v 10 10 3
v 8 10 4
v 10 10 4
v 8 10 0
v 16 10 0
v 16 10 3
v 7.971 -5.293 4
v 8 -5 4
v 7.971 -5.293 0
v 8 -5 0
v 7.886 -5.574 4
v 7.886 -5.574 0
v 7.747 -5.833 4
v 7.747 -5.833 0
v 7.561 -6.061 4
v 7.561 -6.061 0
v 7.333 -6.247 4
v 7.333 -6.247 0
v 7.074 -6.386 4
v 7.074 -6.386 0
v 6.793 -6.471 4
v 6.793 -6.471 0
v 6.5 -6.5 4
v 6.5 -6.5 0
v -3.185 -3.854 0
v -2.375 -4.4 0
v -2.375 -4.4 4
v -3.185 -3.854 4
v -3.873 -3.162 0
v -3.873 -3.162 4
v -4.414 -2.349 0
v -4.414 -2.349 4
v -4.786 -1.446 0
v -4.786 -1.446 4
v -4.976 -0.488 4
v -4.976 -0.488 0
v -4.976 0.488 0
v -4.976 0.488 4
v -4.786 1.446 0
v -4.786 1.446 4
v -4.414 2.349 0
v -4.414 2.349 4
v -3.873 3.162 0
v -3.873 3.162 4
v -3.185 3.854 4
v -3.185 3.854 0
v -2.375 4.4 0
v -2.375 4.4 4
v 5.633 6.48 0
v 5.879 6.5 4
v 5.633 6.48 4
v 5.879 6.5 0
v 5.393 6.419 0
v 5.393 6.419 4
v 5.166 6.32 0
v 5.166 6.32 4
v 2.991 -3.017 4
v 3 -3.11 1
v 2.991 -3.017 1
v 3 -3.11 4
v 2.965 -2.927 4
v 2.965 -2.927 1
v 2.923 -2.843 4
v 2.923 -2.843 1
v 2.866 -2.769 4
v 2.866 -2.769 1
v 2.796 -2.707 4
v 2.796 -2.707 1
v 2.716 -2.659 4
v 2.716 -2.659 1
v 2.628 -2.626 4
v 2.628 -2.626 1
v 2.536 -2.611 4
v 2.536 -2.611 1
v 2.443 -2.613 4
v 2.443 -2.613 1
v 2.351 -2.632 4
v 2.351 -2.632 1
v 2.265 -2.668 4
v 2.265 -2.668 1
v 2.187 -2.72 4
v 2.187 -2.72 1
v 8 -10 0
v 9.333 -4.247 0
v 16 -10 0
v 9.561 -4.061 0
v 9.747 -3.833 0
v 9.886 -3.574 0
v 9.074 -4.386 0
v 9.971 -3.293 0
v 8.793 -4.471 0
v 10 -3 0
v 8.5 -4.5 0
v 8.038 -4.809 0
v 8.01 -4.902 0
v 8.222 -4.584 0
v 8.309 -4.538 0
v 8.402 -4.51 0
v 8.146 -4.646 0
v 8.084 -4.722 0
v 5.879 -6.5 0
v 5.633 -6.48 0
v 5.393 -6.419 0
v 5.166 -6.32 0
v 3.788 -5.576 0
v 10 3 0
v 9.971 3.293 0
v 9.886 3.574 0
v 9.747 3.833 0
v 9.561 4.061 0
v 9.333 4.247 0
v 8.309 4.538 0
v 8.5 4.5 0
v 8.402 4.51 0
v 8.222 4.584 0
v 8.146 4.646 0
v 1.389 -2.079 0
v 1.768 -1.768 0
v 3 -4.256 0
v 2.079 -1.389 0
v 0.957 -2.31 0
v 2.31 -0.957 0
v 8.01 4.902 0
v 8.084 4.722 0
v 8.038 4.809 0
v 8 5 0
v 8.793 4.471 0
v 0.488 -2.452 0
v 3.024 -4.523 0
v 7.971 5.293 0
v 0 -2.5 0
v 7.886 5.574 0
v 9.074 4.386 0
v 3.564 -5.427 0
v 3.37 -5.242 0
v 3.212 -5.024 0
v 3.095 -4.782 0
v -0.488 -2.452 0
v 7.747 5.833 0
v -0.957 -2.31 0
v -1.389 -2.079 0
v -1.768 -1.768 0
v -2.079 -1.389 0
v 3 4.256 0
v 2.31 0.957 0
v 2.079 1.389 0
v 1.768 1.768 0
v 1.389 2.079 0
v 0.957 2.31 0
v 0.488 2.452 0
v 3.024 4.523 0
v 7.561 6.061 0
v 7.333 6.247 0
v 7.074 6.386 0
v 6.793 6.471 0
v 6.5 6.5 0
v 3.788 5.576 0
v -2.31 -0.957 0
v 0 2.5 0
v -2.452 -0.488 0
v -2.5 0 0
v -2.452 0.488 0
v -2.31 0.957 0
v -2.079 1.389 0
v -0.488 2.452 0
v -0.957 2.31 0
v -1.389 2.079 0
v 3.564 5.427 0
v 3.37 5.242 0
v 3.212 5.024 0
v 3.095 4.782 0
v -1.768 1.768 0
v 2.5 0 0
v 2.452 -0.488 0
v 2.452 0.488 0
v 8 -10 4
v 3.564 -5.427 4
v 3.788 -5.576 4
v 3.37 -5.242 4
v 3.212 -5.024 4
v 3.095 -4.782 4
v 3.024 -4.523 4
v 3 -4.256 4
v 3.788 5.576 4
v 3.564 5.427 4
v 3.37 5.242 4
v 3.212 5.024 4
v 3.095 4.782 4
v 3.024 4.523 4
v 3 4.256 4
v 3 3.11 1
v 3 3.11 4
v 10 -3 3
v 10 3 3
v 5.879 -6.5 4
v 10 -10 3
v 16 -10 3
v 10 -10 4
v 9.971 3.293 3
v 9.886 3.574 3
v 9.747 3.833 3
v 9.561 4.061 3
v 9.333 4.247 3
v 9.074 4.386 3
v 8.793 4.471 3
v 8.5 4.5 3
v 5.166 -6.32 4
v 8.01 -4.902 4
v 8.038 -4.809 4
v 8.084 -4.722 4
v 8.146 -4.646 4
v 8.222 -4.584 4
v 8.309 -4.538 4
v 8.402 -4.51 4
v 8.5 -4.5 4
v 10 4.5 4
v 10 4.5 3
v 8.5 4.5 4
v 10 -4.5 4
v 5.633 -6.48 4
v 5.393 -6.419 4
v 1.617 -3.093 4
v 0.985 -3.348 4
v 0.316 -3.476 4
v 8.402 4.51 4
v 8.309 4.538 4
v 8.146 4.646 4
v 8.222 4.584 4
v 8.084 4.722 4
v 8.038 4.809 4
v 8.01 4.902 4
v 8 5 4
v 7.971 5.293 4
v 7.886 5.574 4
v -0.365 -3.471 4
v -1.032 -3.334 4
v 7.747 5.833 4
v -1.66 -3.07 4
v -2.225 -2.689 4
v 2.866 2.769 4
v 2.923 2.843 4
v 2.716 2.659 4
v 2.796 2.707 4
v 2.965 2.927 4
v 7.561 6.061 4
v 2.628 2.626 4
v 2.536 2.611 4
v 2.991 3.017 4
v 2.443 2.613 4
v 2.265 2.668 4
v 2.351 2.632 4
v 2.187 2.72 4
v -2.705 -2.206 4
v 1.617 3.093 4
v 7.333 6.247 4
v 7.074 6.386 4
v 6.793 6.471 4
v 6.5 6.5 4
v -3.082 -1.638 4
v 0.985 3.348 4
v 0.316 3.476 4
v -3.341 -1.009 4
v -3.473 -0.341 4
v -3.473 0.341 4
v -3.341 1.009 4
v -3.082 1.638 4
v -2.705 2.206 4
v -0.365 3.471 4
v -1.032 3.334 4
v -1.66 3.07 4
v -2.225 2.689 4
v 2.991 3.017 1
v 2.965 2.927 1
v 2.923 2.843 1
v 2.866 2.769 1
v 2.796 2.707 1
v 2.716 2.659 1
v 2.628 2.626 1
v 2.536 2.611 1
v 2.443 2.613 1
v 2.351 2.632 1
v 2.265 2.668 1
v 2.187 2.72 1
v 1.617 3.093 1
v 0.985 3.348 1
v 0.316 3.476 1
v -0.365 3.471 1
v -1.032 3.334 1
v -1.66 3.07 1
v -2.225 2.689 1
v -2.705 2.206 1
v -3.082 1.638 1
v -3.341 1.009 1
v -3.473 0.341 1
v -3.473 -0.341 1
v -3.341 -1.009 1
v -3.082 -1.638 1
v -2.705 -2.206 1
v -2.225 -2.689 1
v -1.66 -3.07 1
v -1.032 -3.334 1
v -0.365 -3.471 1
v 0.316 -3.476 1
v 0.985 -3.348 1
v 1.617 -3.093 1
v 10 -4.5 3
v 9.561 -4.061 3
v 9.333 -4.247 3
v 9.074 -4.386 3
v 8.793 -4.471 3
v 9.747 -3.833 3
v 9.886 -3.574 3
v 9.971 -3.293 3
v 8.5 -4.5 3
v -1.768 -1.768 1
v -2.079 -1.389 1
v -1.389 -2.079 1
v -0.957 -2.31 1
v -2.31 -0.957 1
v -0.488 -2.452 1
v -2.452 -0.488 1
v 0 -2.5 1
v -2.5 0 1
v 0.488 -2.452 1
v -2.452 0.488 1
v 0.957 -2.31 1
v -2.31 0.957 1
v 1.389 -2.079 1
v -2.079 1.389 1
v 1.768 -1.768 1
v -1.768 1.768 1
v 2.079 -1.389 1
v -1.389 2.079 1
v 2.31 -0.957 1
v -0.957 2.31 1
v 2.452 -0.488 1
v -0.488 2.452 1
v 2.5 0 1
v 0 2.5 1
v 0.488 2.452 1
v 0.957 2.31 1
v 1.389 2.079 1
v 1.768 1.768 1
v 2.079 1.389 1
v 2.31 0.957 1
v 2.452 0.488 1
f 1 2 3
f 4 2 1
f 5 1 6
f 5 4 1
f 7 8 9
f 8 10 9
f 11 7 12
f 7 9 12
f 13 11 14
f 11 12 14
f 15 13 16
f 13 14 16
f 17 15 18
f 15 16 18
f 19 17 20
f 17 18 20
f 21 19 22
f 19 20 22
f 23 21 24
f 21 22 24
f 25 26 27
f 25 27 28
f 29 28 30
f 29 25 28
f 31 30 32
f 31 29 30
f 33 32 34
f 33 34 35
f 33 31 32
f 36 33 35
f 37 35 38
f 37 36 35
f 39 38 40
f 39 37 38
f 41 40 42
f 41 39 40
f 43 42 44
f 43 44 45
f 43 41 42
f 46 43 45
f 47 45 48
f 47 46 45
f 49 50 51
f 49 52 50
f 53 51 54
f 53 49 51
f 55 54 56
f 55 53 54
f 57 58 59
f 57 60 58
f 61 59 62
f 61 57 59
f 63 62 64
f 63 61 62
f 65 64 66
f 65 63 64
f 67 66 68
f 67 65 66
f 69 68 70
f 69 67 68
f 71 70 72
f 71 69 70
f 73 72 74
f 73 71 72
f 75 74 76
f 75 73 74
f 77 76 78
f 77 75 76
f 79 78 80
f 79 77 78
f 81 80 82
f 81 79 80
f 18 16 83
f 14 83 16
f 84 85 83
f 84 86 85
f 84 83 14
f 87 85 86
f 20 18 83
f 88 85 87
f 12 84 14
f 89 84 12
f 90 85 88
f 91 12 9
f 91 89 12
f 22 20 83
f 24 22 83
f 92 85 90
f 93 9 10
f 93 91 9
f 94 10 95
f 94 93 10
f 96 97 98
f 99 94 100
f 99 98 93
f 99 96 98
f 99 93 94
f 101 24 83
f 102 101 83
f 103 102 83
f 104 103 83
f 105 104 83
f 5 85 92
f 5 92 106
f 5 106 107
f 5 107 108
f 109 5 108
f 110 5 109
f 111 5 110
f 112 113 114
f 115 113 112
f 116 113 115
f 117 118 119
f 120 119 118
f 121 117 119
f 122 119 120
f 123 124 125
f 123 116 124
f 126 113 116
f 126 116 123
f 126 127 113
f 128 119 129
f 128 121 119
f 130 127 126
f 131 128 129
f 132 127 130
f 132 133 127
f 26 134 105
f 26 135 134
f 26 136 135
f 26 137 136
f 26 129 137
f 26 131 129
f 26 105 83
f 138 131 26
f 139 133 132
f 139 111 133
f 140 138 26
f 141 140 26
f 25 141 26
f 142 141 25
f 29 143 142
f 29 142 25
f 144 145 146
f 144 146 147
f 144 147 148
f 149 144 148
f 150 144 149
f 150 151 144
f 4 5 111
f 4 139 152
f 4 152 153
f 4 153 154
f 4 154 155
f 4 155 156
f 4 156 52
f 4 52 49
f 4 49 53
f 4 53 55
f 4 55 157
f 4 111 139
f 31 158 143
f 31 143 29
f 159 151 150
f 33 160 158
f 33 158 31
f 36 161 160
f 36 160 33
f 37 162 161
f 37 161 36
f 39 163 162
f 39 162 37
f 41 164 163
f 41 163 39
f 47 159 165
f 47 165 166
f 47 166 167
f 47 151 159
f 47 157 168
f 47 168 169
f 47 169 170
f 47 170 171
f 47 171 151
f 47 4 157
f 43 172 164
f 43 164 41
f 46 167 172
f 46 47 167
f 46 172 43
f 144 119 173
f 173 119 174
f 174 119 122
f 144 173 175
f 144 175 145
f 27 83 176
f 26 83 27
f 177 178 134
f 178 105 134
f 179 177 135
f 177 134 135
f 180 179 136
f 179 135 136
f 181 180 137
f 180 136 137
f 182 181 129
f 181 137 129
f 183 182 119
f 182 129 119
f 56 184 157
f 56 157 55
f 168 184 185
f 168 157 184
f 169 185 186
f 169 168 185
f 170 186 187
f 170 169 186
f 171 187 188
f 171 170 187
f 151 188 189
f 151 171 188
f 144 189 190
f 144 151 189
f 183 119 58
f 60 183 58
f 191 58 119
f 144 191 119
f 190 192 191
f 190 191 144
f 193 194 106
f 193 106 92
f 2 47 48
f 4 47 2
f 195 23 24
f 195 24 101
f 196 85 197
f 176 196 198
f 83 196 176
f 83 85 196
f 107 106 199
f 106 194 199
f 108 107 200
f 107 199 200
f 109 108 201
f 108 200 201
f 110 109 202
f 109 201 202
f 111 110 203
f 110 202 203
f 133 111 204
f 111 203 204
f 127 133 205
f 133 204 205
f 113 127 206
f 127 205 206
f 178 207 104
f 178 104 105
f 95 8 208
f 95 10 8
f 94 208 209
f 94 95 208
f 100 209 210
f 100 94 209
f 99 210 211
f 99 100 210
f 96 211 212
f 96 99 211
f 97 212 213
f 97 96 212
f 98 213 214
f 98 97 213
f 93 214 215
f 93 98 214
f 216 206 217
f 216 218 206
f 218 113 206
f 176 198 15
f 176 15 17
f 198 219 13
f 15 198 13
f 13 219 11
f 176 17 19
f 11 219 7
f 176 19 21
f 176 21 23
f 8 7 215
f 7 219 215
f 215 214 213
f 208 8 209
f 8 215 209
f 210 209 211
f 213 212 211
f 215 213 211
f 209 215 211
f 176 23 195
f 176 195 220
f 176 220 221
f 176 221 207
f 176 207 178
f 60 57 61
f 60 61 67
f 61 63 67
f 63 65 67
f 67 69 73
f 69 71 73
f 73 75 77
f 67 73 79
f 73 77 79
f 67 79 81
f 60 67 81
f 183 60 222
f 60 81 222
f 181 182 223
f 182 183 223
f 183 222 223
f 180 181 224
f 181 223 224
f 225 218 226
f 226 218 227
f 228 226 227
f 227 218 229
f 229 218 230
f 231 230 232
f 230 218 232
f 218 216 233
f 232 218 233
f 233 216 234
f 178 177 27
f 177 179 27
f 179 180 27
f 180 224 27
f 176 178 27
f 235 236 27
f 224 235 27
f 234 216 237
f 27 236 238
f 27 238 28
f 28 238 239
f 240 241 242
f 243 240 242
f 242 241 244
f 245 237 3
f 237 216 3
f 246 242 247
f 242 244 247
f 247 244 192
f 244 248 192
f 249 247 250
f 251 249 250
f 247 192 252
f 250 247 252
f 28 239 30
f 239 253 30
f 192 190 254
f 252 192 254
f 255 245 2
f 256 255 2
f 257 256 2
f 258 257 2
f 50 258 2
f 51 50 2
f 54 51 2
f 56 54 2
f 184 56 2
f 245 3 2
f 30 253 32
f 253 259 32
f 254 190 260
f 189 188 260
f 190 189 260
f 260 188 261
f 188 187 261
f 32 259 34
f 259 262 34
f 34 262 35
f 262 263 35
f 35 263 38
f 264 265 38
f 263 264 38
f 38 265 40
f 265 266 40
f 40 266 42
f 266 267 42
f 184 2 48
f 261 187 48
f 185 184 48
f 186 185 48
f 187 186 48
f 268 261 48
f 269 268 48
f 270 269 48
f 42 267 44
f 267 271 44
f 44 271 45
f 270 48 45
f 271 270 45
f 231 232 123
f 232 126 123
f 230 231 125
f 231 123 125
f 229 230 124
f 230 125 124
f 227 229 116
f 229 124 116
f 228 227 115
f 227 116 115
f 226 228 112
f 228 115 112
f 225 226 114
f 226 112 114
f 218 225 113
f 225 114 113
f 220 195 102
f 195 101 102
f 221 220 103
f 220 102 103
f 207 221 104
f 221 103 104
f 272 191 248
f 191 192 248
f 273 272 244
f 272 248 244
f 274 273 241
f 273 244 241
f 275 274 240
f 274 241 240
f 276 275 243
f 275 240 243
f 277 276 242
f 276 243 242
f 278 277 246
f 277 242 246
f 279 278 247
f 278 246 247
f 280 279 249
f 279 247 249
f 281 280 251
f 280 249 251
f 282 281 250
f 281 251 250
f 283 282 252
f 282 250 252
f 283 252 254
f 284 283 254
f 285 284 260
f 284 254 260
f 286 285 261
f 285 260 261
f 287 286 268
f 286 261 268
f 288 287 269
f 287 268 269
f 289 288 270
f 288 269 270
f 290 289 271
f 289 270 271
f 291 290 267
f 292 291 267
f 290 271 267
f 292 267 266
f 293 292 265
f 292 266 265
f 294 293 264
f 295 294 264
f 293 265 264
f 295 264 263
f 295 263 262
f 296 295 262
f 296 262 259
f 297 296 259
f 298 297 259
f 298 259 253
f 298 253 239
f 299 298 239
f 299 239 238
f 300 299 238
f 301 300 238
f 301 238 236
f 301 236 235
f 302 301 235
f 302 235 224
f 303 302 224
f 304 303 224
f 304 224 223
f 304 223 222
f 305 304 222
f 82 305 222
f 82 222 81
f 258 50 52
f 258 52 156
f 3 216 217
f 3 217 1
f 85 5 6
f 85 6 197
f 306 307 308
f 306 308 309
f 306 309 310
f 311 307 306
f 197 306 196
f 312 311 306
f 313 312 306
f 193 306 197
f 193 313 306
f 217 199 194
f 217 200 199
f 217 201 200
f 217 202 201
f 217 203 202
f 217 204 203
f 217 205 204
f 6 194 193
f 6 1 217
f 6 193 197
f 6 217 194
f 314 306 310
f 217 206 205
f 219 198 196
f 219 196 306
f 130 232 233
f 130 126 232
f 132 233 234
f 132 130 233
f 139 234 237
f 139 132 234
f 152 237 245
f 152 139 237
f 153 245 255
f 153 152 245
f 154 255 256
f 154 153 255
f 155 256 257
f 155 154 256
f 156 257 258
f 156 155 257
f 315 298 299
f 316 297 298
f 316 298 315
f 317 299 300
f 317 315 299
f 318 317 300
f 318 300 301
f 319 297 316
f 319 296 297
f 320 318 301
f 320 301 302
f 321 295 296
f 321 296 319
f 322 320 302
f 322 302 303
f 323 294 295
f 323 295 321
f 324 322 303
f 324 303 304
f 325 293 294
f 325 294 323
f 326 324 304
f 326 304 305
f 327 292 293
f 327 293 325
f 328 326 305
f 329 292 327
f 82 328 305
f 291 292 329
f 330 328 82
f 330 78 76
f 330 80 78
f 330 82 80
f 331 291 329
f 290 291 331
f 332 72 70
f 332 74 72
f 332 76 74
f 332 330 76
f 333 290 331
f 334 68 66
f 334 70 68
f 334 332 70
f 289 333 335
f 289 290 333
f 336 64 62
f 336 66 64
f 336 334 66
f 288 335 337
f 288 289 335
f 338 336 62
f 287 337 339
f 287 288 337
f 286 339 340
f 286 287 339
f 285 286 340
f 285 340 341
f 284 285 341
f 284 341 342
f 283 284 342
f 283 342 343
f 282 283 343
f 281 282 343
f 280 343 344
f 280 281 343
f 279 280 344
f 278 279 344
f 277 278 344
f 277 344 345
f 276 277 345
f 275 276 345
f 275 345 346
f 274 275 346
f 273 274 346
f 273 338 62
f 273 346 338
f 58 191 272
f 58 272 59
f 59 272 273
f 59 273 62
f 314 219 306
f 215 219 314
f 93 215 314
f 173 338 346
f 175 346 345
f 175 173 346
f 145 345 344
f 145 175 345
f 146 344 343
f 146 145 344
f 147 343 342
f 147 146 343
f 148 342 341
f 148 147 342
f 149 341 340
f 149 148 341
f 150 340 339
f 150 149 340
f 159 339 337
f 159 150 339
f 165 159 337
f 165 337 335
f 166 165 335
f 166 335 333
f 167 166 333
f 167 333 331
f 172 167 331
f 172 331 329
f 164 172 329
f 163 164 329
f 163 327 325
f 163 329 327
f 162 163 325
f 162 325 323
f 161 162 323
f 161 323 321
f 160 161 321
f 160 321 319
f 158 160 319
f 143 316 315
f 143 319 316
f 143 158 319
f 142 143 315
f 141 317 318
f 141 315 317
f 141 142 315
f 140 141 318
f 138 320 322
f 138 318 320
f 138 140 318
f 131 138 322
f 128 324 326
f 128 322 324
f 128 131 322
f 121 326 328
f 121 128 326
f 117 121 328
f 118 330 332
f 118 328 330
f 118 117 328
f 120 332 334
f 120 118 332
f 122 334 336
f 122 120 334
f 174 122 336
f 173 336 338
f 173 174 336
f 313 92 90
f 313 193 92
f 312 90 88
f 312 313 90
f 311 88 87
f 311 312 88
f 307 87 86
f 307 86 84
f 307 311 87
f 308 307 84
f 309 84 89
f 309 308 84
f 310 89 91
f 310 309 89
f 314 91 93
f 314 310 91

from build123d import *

# Parameters (mm, degrees)
SKETCH1_R           = 2.5
BOSS_EXTRUDE1_DEPTH = 4
SKETCH4_R           = 3.49
CUT_EXTRUDE1_DEPTH  = 3
SKETCH5_W           = 6
SKETCH5_H           = 20
CUT_EXTRUDE2_DEPTH  = 1
CUT_EXTRUDE3_REACH  = 21.287
FILLET1_R           = 0.5
FILLET2_R           = 1.5
FILLET3_R           = 0.5


with BuildPart() as part:
    # Sketch1 → Boss-Extrude1 (new body)
    with BuildSketch(Plane.XY):
        with BuildLine():
            Line((-2.374946989, 4.399957591), (8, 10))
            Line((8, 10), (16, 10))
            Line((16, 10), (16, -10))
            Line((16, -10), (8, -10))
            Line((8, -10), (-2.374946989, -4.399957591))
            ThreePointArc((-2.374946989, -4.399957591), (-5, 0), (-2.374946989, 4.399957591))
        make_face()
        Circle(SKETCH1_R, mode=Mode.SUBTRACT)
    extrude(amount=BOSS_EXTRUDE1_DEPTH)

    # Sketch4 → Cut-Extrude1 (cut)
    with BuildSketch(Plane.XY.offset(4)):
        Circle(SKETCH4_R)
    extrude(amount=-CUT_EXTRUDE1_DEPTH, mode=Mode.SUBTRACT)

    # Sketch5 → Cut-Extrude2 (cut)
    with BuildSketch(Plane.XY.offset(4)):
        with Locations((13, 0)):
            Rectangle(SKETCH5_W, SKETCH5_H)
    extrude(amount=-CUT_EXTRUDE2_DEPTH, mode=Mode.SUBTRACT)

    # Sketch6 → Cut-Extrude3 (cut, up to next)
    with BuildSketch(Plane.XY.offset(4), mode=Mode.PRIVATE) as cut_extrude3_sk1:
        Polygon((3, 5.150585296), (5.5, 6.5), (8, 6.5), (8, 4.5), (10, 4.5), (10, -4.5), (8, -4.5), (8, -6.5), (5.5, -6.5), (3, -5.150585296), align=None)
    cut_extrude3_tool1 = extrude(cut_extrude3_sk1.sketch, amount=-CUT_EXTRUDE3_REACH, mode=Mode.PRIVATE) & part.part
    add(cut_extrude3_tool1.solids().sort_by_distance((6.361806, 0, 4))[0], mode=Mode.SUBTRACT)

    # Fillet1
    fillet1_edges = [part.edges().sort_by_distance(p)[0] for p in [
        (3, -1.783283488, 2.5),
        (3, 1.783283488, 2.5),
    ]]
    fillet(fillet1_edges, radius=FILLET1_R)

    # Fillet2
    fillet2_edges = [part.edges().sort_by_distance(p)[0] for p in [
        (10, 4.5, 1.5),
        (3, -5.150585296, 2),
        (3, 5.150585296, 2),
        (5.5, 6.5, 2),
        (8, 6.5, 2),
        (10, -4.5, 1.5),
        (8, -6.5, 2),
        (5.5, -6.5, 2),
    ]]
    fillet(fillet2_edges, radius=FILLET2_R)

    # Fillet3
    fillet3_edges = [part.edges().sort_by_distance(p)[0] for p in [
        (8, -4.5, 2),
        (8, 4.5, 2),
    ]]
    fillet(fillet3_edges, radius=FILLET3_R - 0.0001)  # a hair under: the kernel refuses the full size


solid = part.part
